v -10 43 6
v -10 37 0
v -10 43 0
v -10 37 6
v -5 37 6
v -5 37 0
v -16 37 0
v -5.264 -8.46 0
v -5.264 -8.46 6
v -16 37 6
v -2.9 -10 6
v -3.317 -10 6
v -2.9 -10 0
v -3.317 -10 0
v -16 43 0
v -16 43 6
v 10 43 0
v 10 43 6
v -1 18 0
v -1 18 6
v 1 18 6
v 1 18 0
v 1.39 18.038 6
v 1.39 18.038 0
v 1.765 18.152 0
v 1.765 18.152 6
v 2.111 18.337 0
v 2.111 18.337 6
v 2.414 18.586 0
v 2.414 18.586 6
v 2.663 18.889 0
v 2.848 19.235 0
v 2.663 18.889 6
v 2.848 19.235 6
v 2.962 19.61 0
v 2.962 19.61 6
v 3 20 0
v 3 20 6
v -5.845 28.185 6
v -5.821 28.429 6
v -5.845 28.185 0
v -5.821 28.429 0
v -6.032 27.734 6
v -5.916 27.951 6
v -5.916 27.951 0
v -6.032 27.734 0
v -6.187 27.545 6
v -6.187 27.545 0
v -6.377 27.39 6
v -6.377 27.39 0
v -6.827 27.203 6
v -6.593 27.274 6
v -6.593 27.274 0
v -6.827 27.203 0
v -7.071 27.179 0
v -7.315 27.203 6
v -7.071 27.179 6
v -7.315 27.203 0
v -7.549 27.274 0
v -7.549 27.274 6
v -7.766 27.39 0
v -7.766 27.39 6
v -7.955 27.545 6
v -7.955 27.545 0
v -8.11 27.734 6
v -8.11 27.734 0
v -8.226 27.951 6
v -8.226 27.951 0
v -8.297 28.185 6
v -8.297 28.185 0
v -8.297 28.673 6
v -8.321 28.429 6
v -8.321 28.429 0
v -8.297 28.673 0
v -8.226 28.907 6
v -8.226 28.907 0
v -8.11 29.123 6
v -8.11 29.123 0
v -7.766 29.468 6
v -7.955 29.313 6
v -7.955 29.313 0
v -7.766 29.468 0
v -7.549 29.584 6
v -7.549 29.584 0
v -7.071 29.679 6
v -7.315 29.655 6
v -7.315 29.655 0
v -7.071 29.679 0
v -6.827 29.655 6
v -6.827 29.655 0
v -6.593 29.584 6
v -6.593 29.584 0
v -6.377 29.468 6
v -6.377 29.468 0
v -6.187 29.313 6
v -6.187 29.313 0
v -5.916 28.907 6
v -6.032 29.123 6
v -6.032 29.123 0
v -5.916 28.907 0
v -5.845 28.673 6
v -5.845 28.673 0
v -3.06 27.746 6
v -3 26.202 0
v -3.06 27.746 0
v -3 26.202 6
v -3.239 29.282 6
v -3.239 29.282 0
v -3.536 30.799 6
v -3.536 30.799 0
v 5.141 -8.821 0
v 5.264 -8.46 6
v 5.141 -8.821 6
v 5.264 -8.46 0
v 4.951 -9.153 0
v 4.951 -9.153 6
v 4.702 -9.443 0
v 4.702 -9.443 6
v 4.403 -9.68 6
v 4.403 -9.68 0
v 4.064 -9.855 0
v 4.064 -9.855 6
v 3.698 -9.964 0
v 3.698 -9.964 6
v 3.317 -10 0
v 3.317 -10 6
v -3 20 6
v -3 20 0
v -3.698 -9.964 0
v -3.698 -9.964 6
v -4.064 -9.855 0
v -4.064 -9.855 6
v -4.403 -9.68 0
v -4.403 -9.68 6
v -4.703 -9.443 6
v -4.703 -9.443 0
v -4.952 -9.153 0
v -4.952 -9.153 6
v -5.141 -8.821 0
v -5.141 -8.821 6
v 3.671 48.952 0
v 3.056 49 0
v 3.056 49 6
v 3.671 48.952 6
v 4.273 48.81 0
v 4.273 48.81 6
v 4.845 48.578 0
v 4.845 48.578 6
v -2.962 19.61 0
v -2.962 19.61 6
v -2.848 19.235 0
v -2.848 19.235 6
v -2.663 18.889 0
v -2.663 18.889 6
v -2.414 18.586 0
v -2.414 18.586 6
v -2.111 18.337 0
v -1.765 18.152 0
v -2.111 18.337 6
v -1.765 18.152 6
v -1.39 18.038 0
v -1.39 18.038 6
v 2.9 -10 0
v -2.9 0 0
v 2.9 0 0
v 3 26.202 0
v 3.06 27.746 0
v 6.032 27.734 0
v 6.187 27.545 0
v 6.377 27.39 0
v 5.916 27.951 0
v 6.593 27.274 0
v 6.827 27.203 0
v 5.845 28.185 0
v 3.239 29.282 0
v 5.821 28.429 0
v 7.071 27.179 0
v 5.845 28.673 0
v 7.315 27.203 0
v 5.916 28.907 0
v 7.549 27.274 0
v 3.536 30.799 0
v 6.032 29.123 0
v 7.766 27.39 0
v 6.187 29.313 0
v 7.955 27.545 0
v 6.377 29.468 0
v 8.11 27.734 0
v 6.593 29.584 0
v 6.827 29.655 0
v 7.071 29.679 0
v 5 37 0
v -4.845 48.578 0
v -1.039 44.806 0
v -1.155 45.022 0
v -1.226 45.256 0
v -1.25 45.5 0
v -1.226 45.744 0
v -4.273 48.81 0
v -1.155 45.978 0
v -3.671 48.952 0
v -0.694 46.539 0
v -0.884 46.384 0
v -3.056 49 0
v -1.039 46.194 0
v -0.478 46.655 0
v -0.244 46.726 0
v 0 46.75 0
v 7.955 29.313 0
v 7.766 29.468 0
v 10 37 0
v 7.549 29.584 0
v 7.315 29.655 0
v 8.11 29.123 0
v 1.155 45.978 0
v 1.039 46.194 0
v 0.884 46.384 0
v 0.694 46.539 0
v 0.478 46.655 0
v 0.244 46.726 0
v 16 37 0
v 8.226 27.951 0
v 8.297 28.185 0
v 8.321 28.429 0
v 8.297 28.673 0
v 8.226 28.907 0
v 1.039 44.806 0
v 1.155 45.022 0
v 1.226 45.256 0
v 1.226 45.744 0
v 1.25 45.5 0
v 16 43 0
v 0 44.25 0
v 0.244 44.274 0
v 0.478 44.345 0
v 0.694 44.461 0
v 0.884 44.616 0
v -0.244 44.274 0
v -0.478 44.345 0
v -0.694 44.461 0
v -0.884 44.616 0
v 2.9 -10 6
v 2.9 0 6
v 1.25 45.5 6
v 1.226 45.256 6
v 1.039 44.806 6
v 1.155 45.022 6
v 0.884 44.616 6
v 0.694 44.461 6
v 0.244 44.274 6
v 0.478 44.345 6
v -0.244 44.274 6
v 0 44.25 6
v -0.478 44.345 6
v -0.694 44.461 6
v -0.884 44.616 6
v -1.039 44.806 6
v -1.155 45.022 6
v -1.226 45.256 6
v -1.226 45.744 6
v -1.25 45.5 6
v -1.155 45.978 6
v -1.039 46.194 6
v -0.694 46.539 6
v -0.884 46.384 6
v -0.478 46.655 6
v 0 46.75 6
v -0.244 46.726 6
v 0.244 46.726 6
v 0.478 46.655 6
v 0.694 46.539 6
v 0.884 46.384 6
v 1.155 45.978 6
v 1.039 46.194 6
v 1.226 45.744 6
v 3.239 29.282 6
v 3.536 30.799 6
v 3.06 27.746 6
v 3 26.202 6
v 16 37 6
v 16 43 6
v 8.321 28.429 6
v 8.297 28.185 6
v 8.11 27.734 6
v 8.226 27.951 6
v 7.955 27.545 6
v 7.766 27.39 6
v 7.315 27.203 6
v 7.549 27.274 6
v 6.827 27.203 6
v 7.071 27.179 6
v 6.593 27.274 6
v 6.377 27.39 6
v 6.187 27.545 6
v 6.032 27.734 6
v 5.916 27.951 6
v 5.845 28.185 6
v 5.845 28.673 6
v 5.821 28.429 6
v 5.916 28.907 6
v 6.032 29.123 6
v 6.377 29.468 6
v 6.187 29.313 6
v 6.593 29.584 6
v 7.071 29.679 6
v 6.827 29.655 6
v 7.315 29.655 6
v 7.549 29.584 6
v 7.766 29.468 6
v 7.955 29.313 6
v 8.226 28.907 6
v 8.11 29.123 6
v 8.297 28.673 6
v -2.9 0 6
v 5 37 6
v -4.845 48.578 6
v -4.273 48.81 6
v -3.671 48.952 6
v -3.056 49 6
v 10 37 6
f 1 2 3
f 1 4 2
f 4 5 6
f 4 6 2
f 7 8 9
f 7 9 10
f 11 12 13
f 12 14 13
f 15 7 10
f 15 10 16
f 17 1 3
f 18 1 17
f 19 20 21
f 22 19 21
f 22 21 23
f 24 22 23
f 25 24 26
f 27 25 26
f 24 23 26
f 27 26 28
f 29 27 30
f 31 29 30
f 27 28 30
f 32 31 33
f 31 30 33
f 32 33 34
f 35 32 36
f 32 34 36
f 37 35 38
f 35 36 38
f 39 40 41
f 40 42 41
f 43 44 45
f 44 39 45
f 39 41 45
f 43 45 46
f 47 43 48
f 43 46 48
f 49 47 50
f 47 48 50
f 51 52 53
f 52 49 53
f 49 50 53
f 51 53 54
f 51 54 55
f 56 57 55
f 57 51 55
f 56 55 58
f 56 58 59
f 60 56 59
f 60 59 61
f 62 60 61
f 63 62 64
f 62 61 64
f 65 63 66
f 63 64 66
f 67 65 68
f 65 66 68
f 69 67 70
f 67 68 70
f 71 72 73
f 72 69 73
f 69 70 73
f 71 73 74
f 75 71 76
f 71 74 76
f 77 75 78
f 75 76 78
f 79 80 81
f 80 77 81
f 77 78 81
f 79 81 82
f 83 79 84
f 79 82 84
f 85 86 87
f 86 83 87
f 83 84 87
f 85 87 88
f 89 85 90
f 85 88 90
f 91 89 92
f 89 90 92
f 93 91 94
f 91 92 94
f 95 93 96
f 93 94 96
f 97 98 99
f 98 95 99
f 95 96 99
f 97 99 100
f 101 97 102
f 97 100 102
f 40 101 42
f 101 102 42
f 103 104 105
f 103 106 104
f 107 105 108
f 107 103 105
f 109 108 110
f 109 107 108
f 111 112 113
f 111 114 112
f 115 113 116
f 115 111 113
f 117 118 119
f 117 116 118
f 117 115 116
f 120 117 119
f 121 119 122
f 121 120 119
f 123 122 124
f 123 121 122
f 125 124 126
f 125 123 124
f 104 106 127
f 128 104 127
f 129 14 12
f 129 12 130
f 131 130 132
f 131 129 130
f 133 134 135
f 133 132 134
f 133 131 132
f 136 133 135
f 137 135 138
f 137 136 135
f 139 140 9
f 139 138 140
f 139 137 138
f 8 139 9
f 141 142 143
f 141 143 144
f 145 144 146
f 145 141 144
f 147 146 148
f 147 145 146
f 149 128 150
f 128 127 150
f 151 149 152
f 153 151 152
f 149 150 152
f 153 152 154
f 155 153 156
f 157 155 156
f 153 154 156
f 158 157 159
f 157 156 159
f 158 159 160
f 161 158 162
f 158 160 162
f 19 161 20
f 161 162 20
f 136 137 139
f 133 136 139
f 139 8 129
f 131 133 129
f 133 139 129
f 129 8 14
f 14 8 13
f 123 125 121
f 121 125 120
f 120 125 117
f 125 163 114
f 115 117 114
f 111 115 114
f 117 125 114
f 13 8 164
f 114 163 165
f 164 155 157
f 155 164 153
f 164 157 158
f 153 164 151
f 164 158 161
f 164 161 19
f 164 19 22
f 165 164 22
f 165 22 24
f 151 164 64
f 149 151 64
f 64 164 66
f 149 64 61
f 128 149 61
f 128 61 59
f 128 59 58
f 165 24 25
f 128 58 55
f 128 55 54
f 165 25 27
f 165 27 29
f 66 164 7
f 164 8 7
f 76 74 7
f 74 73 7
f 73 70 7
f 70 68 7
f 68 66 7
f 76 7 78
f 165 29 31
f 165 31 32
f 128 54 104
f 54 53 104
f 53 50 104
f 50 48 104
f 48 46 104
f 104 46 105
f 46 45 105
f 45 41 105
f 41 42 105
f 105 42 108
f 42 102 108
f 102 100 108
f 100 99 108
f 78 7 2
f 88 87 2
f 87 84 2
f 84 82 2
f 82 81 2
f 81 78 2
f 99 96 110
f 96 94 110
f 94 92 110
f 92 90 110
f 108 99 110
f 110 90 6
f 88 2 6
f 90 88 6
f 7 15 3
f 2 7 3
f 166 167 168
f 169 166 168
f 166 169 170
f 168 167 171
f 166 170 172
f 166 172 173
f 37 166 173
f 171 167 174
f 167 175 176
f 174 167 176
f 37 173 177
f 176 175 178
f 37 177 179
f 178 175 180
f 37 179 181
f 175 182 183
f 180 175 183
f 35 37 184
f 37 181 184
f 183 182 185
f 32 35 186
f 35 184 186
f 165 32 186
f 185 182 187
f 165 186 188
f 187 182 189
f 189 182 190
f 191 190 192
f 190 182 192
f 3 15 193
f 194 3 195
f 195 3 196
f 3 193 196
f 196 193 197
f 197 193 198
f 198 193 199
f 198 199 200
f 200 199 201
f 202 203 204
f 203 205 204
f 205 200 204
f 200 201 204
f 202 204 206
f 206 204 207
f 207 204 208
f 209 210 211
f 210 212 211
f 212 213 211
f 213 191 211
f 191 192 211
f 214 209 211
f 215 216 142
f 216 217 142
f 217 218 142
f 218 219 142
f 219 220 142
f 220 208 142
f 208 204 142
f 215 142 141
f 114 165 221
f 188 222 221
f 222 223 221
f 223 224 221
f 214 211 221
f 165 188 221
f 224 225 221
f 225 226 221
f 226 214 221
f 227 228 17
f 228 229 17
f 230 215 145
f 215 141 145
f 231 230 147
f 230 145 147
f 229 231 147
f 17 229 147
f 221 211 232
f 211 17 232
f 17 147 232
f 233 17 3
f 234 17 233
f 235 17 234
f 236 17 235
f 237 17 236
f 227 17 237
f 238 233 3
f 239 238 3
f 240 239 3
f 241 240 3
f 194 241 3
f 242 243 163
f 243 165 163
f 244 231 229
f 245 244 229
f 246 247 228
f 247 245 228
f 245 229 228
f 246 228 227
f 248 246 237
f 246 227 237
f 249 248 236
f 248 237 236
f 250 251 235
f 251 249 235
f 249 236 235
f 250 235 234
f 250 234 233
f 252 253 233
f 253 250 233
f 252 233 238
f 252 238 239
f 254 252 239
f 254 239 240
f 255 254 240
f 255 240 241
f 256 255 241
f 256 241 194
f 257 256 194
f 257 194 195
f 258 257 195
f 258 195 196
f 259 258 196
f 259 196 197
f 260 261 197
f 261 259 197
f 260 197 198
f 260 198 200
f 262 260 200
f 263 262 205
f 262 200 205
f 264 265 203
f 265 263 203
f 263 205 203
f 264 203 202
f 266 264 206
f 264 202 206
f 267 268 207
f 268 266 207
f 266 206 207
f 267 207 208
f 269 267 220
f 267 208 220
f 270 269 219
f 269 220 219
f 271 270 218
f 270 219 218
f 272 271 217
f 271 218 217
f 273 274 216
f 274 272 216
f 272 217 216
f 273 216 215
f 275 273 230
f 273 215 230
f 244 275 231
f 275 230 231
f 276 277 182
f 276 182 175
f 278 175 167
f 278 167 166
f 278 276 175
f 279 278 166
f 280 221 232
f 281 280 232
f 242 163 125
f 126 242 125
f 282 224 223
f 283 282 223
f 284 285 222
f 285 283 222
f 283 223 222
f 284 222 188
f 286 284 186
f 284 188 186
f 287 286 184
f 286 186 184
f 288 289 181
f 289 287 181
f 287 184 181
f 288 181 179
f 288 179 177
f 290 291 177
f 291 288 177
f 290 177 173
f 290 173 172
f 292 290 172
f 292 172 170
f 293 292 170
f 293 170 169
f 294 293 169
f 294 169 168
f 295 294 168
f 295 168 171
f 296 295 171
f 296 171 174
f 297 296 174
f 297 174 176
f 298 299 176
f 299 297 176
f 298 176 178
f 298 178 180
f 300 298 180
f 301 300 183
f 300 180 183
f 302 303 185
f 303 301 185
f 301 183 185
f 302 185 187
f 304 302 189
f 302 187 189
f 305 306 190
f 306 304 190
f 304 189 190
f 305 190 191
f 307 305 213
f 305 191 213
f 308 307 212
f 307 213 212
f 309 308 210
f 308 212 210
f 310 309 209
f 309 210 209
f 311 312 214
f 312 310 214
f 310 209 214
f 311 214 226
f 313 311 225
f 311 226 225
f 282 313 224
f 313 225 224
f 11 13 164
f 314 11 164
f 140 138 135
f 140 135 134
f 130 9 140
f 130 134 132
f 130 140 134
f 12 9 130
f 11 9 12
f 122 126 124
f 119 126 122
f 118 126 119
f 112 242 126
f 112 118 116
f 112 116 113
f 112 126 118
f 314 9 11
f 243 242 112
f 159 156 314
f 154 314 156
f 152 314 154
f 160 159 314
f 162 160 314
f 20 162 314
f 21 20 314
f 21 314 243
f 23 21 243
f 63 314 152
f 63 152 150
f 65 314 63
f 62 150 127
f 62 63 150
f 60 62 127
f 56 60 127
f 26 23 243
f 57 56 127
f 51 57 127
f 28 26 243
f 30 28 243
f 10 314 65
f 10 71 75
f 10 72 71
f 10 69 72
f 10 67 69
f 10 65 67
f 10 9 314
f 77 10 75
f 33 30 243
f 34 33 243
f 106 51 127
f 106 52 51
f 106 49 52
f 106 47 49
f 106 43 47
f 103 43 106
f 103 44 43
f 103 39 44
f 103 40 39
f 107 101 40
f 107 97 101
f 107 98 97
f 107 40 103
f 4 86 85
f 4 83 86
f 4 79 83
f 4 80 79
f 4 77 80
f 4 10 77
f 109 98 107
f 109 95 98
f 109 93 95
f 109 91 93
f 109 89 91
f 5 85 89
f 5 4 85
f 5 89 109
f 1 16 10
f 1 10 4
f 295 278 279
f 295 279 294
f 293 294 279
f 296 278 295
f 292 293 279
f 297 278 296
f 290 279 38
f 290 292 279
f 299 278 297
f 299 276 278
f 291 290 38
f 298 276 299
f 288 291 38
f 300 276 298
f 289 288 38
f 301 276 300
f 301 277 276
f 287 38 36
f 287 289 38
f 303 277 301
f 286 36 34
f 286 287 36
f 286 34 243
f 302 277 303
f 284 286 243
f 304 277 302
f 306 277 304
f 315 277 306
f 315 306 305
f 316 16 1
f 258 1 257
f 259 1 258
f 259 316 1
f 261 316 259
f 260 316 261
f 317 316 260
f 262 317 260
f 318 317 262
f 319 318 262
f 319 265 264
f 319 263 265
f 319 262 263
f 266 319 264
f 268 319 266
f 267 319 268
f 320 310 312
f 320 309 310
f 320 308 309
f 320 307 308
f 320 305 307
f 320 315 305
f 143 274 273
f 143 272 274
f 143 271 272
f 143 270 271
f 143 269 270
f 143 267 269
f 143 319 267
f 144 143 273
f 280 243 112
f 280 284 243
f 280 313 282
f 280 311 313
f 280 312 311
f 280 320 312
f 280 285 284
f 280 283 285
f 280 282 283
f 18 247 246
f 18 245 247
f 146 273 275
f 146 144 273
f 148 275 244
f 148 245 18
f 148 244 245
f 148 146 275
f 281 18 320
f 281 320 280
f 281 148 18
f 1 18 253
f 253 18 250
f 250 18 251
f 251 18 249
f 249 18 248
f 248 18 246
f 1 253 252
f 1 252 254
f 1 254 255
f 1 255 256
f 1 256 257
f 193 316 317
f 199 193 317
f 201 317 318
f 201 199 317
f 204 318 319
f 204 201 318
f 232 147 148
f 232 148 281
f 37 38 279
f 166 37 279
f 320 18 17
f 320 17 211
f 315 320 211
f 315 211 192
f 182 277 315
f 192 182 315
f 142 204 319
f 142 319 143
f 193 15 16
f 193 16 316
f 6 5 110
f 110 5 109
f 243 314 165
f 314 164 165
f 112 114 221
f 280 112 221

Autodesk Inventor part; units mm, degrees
ref_plane "YZ Plane" through (0, 0, 0) normal (1, 0, 0) x (0, 1, 0)
ref_plane "XZ Plane" through (0, 0, 0) normal (0, 1, 0) x (-1, 0, 0)
ref_plane "XY Plane" through (0, 0, 0) normal (0, 0, 1) x (1, 0, 0)
sketch "Sketch1" plane through (0, 0, 0) normal (0, 0, 1) x (1, 0, 0)
  circle A0 centre (0, 35.5) radius 10 construction
  line L0 (-2.9, -10) -> (-2.9, 0)
  line L1 (-2.9, 0) -> (2.9, 0)
  line L2 (2.9, 0) -> (2.9, -10)
  line L3 (-3.3173, -10) -> (-2.9, -10)
  line L4 (2.9, -10) -> (3.3173, -10)
  circle A1 centre (-7.0711, 28.4289) radius 1.25
  circle A2 centre (7.0711, 28.4289) radius 1.25
  circle A3 centre (0, 45.5) radius 1.25
  line L5 (-16, 37) -> (-16, 43)
  line L6 (16, 37) -> (16, 43)
  line L7 (-5.2638, -8.4597) -> (-16, 37)
  line L8 (5.2638, -8.4597) -> (16, 37)
  line L9 (-16, 43) -> (-4.8446, 48.5777)
  line L10 (-3.0557, 49) -> (3.0557, 49)
  line L11 (4.8446, 48.5777) -> (16, 43)
  arc A4 (-3.0557, 49) -> (-4.8446, 48.5777) centre (-3.0557, 45) ccw
  arc A5 (4.8446, 48.5777) -> (3.0557, 49) centre (3.0557, 45) ccw
  line L12 (0, 49) -> (0, 0) construction
  line L13 (-7.0711, 28.4289) -> (0, 35.5) construction
  line L14 (0, 35.5) -> (7.0711, 28.4289) construction
  arc A6 (-5.2638, -8.4597) -> (-3.3173, -10) centre (-3.3173, -8) ccw
  arc A7 (3.3173, -10) -> (5.2638, -8.4597) centre (3.3173, -8) ccw
  circle A8 centre (0, 35.5) radius 15.25 construction
  point P0 (0, 43)
  point P1 (4.9, -10)
  point P2 (-4.9, -10)
  point P3 (0, 43)
  point P4 (-4, 49)
  point P5 (4, 49)
  dimension "d69" = 20
  dimension "d88" = 5.8
  dimension "d95" = 2
  dimension "d96" = 2
  dimension "d97" = 10
  dimension "d98" = 10
  dimension "d109" = 43
  dimension "d112" = 2.5
  dimension "d113" = 2.5
  dimension "d114" = 2.5
  dimension "d123" = 32
  dimension "d126" = 8
  dimension "d127" = 4
  dimension "d144" = 16
  dimension "d145" = 35.5
  dimension "d153" = 6
  dimension "d155" = 6
  dimension "d156" = 135
  dimension "d163" = 2
  dimension "d169" = 30.5
extrude "Extrusion7" add sketch "Sketch1" along normal blind 6
sketch "Sketch3" plane through (0, 0, 6) normal (0, 0, 1) x (1, 0, 0)
  line L0 (16, 37) -> (16, 43) projected
  line L1 (-16, 43) -> (-16, 37) projected
  line L2 (-10, 43) -> (10, 43)
  line L3 (10, 43) -> (10, 37)
  line L4 (-10, 37) -> (-10, 43)
  line L5 (10, 37) -> (5, 37)
  line L6 (-5, 37) -> (-10, 37)
  line L7 (5.2638, -8.4597) -> (16, 37) projected
  line L8 (-16, 37) -> (-5.2638, -8.4597) projected
  circle A0 centre (0, 45.5) radius 1.25 projected
  circle A1 centre (7.0711, 28.4289) radius 1.25 projected
  circle A2 centre (-7.0711, 28.4289) radius 1.25 projected
  line L9 (3.0557, 49) -> (-3.0557, 49) projected
  line L10 (0, 45.5) -> (0, 35.4997) construction
  line L11 (-7.0711, 28.4289) -> (0, 35.5003) construction
  line L12 (7.0711, 28.4289) -> (0, 35.4997) construction
  line L13 (-5, 37) -> (-3.5355, 30.7988)
  line L14 (-3, 26.2019) -> (-3, 20)
  line L15 (-1, 18) -> (1, 18)
  line L16 (3, 20) -> (3, 26.2019)
  line L17 (3.5355, 30.7988) -> (5, 37)
  arc A3 (-3, 26.2019) -> (-3.5355, 30.7988) centre (-23, 26.2019) ccw
  arc A4 (3.5355, 30.7988) -> (3, 26.2019) centre (23, 26.2019) ccw
  arc A5 (-3, 20) -> (-1, 18) centre (-1, 20) ccw
  arc A6 (1, 18) -> (3, 20) centre (1, 20) ccw
  point P0 (0, 0)
  point P1 (4.9, -10)
  point P2 (-4.9, -10)
  point P3 (0, 18)
  dimension "d132" = 6
  dimension "d134" = 6
  dimension "d135" = 6
  dimension "d148" = 5
  dimension "d149" = 5
  dimension "d157" = 25
  dimension "d160" = 6
  dimension "d161" = 20
  dimension "d162" = 2
extrude "Extrusion8" cut sketch "Sketch3" against normal through all contours L2 L3 L5 L17 A4 L16 A6 L15 A5 L14 A3 L13 L6 L4
properties part number "Vert Moto Mount skinny"
